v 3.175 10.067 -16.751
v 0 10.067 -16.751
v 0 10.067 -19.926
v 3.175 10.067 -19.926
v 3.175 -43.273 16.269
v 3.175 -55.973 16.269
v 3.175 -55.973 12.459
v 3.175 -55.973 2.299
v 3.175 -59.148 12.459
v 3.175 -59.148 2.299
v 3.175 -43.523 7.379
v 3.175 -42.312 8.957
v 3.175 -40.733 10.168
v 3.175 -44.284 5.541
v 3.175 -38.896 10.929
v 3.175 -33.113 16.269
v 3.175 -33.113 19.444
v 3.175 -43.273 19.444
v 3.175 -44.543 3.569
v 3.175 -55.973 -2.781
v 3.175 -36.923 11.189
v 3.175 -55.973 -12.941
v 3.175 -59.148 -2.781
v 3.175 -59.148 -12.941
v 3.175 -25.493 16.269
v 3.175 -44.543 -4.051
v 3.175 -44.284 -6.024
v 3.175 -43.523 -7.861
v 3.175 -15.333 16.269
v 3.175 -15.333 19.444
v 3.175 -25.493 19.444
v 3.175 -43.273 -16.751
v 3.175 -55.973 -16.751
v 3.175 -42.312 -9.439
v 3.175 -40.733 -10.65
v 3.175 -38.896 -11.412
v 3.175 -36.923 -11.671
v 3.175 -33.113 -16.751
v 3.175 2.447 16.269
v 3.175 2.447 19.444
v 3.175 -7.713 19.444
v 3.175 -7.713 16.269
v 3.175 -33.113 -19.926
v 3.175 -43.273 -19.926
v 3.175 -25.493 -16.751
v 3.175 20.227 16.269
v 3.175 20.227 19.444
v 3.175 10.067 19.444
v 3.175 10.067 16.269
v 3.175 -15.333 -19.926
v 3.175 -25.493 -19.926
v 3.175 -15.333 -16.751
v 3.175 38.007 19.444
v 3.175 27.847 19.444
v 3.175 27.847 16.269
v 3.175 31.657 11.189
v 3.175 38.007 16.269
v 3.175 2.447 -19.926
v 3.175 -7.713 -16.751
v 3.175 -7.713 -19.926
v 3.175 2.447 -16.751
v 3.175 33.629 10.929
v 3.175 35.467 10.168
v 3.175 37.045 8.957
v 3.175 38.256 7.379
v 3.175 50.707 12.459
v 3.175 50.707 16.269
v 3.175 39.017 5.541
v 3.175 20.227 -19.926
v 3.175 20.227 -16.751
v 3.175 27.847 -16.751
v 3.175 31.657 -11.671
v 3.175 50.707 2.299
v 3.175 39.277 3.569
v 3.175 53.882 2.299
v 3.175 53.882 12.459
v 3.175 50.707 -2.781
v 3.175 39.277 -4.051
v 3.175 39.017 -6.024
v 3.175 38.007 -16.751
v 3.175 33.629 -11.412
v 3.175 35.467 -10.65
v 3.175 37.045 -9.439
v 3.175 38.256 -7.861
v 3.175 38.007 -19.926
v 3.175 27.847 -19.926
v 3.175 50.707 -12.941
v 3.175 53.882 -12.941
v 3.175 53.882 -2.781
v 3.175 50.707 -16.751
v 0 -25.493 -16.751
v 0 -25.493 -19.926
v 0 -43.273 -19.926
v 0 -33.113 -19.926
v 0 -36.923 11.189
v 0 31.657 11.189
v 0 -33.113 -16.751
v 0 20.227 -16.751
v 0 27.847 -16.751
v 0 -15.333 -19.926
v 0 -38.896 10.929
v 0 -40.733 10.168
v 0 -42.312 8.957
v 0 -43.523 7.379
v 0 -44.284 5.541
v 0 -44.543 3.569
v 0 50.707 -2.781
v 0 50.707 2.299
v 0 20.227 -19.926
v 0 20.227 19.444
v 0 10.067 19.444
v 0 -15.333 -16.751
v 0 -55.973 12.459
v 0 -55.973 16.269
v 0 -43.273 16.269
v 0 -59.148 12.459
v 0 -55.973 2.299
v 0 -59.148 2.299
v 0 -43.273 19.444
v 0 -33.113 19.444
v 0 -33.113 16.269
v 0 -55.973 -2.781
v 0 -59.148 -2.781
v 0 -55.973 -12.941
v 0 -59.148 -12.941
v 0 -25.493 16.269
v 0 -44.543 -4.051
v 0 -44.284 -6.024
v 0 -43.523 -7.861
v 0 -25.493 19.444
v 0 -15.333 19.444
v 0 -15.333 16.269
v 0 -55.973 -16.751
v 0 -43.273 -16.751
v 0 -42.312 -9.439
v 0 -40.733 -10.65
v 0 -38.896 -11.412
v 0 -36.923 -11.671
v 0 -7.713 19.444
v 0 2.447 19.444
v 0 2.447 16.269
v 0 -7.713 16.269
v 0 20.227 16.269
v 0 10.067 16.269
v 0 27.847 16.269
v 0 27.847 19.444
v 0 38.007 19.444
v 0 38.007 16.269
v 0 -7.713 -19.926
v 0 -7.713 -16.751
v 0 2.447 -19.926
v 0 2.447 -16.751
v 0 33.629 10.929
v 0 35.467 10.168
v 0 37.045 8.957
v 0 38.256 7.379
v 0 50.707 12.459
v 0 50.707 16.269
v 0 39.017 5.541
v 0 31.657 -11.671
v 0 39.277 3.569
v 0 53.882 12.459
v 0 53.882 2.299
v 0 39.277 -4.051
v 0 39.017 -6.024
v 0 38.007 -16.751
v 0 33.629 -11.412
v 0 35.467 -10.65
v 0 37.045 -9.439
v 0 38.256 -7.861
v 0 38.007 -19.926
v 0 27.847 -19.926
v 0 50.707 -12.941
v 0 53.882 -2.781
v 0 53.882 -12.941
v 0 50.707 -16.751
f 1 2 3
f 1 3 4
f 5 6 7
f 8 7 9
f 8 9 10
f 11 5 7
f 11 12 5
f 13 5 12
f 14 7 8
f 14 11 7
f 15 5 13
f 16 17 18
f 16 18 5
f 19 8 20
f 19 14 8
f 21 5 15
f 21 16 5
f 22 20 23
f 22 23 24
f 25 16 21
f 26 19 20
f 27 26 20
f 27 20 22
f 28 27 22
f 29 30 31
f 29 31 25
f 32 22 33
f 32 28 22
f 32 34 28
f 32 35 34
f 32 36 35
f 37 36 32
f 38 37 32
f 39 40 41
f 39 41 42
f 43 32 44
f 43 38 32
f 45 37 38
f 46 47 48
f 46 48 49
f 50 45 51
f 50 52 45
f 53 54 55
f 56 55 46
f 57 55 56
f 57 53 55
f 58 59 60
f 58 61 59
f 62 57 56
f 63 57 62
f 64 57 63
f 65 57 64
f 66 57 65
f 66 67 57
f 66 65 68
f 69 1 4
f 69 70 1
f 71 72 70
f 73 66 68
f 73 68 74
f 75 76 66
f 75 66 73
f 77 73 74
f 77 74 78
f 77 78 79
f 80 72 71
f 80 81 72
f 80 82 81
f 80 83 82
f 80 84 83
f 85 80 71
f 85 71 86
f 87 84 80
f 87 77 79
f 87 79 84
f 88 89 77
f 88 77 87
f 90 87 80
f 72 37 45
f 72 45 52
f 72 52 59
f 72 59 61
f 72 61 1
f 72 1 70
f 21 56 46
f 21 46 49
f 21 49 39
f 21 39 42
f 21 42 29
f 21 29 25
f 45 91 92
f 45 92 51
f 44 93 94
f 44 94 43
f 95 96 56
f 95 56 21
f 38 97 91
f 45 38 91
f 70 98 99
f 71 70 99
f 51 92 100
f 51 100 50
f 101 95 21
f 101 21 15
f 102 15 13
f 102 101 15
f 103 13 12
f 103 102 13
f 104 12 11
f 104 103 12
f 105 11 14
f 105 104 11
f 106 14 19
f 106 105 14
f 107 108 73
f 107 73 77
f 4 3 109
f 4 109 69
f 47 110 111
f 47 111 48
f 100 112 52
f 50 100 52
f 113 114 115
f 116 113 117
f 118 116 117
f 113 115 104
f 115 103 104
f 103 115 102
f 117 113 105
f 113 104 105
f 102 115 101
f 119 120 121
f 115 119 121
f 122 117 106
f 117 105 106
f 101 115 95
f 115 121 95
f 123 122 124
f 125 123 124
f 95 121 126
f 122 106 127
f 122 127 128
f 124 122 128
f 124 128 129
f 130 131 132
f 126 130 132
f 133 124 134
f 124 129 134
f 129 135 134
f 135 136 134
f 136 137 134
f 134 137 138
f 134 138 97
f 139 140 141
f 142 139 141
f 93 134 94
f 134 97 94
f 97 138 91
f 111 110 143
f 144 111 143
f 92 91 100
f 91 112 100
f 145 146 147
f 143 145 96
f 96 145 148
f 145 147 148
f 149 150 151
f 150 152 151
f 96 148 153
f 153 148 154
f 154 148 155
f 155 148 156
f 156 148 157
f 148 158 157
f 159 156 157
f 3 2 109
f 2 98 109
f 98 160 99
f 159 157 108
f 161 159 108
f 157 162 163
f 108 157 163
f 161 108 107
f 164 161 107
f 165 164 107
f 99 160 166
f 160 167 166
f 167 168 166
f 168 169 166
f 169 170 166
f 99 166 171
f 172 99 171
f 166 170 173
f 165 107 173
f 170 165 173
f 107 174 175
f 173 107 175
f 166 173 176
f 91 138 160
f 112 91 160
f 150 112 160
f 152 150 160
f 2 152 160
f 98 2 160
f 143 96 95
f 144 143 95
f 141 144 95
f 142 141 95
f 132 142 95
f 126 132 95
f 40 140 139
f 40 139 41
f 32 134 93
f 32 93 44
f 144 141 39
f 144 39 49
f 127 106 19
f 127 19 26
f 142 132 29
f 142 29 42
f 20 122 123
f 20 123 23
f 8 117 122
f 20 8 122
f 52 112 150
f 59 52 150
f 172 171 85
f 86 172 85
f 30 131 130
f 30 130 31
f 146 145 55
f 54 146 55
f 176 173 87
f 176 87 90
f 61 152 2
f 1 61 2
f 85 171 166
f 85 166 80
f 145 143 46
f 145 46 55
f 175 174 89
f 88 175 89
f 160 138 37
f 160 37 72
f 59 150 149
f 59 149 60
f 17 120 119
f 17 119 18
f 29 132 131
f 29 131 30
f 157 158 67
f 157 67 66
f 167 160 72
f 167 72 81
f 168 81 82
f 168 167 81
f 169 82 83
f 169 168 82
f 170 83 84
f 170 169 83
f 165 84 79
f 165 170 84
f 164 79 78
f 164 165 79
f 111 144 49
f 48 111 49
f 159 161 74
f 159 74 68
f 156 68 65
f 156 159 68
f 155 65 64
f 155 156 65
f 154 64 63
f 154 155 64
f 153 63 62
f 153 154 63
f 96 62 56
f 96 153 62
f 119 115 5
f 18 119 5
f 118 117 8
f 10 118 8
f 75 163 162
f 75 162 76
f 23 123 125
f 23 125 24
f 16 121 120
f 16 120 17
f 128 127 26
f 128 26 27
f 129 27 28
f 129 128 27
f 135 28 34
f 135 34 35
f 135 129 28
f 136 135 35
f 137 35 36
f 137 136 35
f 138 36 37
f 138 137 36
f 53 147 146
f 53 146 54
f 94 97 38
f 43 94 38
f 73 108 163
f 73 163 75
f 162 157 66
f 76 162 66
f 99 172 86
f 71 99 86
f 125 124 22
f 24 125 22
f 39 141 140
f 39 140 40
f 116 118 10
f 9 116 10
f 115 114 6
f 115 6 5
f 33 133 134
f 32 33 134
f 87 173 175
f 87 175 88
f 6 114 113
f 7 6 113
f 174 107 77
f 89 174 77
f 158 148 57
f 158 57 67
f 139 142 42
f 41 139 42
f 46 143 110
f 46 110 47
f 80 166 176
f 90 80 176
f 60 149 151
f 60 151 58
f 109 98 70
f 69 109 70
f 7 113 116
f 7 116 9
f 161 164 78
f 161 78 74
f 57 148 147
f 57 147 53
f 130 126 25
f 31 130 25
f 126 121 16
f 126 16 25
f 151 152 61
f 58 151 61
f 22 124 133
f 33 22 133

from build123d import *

# Parameters (mm, degrees)
SKETCH1_W               = 33.02
SKETCH1_H               = 106.68
BOSS_EXTRUDE1_DEPTH     = 3.175
SKETCH3_W               = 3.175
SKETCH3_H               = 10.16
BOSS_EXTRUDE2_DEPTH     = 3.175
LPATTERN1_COUNT         = 5
LPATTERN1_PITCH         = 17.78
MIRROR1_COPY_1_SKETCH_W = 3.175
MIRROR1_COPY_1_SKETCH_H = 10.16
MIRROR1_COPY_1_DEPTH    = 3.175
MIRROR1_COPY_2_SKETCH_W = 3.175
MIRROR1_COPY_2_SKETCH_H = 10.16
MIRROR1_COPY_2_DEPTH    = 3.175
MIRROR1_COPY_3_SKETCH_W = 3.175
MIRROR1_COPY_3_SKETCH_H = 10.16
MIRROR1_COPY_3_DEPTH    = 3.175
MIRROR1_COPY_4_SKETCH_W = 3.175
MIRROR1_COPY_4_SKETCH_H = 10.16
MIRROR1_COPY_4_DEPTH    = 3.175
SKETCH4_W               = 3.175
SKETCH4_H               = 10.16
BOSS_EXTRUDE3_DEPTH     = 3.175
MIRROR3_COPY_1_SKETCH_W = 3.175
MIRROR3_COPY_1_SKETCH_H = 10.16
MIRROR3_COPY_1_DEPTH    = 3.175


with BuildPart() as part:
    # Sketch1 → Boss-Extrude1 (new body)
    with BuildSketch(Plane(origin=(0, 0, 0), x_dir=(0, 0, -1), z_dir=(1, 0, 0))):
        with Locations((0.241329403, -2.63343568)):
            Rectangle(SKETCH1_W, SKETCH1_H)
        with BuildLine():
            Line((4.051329403, 39.27656432), (-3.568670597, 39.27656432))
            ThreePointArc((-3.568670597, 39.27656432), (-8.95682427, 37.044717993), (-11.188670597, 31.65656432))
            Line((-11.188670597, 31.65656432), (-11.188670597, -36.92343568))
            ThreePointArc((-11.188670597, -36.92343568), (-8.95682427, -42.311589352), (-3.568670597, -44.54343568))
            Line((-3.568670597, -44.54343568), (4.051329403, -44.54343568))
            ThreePointArc((4.051329403, -44.54343568), (9.439483075, -42.311589352), (11.671329403, -36.92343568))
            Line((11.671329403, -36.92343568), (11.671329403, 31.65656432))
            ThreePointArc((11.671329403, 31.65656432), (9.439483075, 37.044717993), (4.051329403, 39.27656432))
        make_face(mode=Mode.SUBTRACT)
    extrude(amount=BOSS_EXTRUDE1_DEPTH)

    # Sketch3 → Boss-Extrude2 (add)
    with BuildSketch(Plane.XY.offset(16.268670597)):
        with Locations((1.5875, 32.92656432)):
            Rectangle(SKETCH3_W, SKETCH3_H)
    boss_extrude2 = extrude(amount=BOSS_EXTRUDE2_DEPTH)

    # LPattern1: Boss-Extrude2 ×5
    with Locations(*[(0, -i * LPATTERN1_PITCH, 0) for i in range(1, LPATTERN1_COUNT)]):
        add(boss_extrude2)

    # Mirror1: Boss-Extrude2 across plane
    add(boss_extrude2.mirror(Plane(origin=(0, 0, -0.241329403), x_dir=(1, 0, 0), z_dir=(0, 0, -1))))

    # Mirror1 copy 1 sketch → Mirror1 copy 1 (add)
    with BuildSketch(Plane(origin=(0, -17.78, -16.751329403), x_dir=(1, 0, 0), z_dir=(0, 0, -1))):
        with Locations((1.5875, -32.92656432)):
            Rectangle(MIRROR1_COPY_1_SKETCH_W, MIRROR1_COPY_1_SKETCH_H)
    extrude(amount=MIRROR1_COPY_1_DEPTH)

    # Mirror1 copy 2 sketch → Mirror1 copy 2 (add)
    with BuildSketch(Plane(origin=(0, -35.56, -16.751329403), x_dir=(1, 0, 0), z_dir=(0, 0, -1))):
        with Locations((1.5875, -32.92656432)):
            Rectangle(MIRROR1_COPY_2_SKETCH_W, MIRROR1_COPY_2_SKETCH_H)
    extrude(amount=MIRROR1_COPY_2_DEPTH)

    # Mirror1 copy 3 sketch → Mirror1 copy 3 (add)
    with BuildSketch(Plane(origin=(0, -53.34, -16.751329403), x_dir=(1, 0, 0), z_dir=(0, 0, -1))):
        with Locations((1.5875, -32.92656432)):
            Rectangle(MIRROR1_COPY_3_SKETCH_W, MIRROR1_COPY_3_SKETCH_H)
    extrude(amount=MIRROR1_COPY_3_DEPTH)

    # Mirror1 copy 4 sketch → Mirror1 copy 4 (add)
    with BuildSketch(Plane(origin=(0, -71.12, -16.751329403), x_dir=(1, 0, 0), z_dir=(0, 0, -1))):
        with Locations((1.5875, -32.92656432)):
            Rectangle(MIRROR1_COPY_4_SKETCH_W, MIRROR1_COPY_4_SKETCH_H)
    extrude(amount=MIRROR1_COPY_4_DEPTH)

    # Sketch4 → Boss-Extrude3 (add)
    with BuildSketch(Plane(origin=(0, 50.70656432, 0), x_dir=(1, 0, 0), z_dir=(0, 1, 0))):
        with Locations((1.5875, -7.378670597)):
            Rectangle(SKETCH4_W, SKETCH4_H)
    boss_extrude3 = extrude(amount=BOSS_EXTRUDE3_DEPTH)

    # Mirror2: Boss-Extrude3 across plane
    add(boss_extrude3.mirror(Plane(origin=(0, 0, -0.241329403), x_dir=(1, 0, 0), z_dir=(0, 0, -1))))

    # Mirror3: Boss-Extrude3 across plane
    add(boss_extrude3.mirror(Plane.ZX.offset(-2.63343568)))

    # Mirror3 copy 1 sketch → Mirror3 copy 1 (add)
    with BuildSketch(Plane(origin=(0, -55.97343568, -0.482658805), x_dir=(1, 0, 0), z_dir=(0, -1, 0))):
        with Locations((1.5875, -7.378670597)):
            Rectangle(MIRROR3_COPY_1_SKETCH_W, MIRROR3_COPY_1_SKETCH_H)
    extrude(amount=MIRROR3_COPY_1_DEPTH)


solid = part.part
